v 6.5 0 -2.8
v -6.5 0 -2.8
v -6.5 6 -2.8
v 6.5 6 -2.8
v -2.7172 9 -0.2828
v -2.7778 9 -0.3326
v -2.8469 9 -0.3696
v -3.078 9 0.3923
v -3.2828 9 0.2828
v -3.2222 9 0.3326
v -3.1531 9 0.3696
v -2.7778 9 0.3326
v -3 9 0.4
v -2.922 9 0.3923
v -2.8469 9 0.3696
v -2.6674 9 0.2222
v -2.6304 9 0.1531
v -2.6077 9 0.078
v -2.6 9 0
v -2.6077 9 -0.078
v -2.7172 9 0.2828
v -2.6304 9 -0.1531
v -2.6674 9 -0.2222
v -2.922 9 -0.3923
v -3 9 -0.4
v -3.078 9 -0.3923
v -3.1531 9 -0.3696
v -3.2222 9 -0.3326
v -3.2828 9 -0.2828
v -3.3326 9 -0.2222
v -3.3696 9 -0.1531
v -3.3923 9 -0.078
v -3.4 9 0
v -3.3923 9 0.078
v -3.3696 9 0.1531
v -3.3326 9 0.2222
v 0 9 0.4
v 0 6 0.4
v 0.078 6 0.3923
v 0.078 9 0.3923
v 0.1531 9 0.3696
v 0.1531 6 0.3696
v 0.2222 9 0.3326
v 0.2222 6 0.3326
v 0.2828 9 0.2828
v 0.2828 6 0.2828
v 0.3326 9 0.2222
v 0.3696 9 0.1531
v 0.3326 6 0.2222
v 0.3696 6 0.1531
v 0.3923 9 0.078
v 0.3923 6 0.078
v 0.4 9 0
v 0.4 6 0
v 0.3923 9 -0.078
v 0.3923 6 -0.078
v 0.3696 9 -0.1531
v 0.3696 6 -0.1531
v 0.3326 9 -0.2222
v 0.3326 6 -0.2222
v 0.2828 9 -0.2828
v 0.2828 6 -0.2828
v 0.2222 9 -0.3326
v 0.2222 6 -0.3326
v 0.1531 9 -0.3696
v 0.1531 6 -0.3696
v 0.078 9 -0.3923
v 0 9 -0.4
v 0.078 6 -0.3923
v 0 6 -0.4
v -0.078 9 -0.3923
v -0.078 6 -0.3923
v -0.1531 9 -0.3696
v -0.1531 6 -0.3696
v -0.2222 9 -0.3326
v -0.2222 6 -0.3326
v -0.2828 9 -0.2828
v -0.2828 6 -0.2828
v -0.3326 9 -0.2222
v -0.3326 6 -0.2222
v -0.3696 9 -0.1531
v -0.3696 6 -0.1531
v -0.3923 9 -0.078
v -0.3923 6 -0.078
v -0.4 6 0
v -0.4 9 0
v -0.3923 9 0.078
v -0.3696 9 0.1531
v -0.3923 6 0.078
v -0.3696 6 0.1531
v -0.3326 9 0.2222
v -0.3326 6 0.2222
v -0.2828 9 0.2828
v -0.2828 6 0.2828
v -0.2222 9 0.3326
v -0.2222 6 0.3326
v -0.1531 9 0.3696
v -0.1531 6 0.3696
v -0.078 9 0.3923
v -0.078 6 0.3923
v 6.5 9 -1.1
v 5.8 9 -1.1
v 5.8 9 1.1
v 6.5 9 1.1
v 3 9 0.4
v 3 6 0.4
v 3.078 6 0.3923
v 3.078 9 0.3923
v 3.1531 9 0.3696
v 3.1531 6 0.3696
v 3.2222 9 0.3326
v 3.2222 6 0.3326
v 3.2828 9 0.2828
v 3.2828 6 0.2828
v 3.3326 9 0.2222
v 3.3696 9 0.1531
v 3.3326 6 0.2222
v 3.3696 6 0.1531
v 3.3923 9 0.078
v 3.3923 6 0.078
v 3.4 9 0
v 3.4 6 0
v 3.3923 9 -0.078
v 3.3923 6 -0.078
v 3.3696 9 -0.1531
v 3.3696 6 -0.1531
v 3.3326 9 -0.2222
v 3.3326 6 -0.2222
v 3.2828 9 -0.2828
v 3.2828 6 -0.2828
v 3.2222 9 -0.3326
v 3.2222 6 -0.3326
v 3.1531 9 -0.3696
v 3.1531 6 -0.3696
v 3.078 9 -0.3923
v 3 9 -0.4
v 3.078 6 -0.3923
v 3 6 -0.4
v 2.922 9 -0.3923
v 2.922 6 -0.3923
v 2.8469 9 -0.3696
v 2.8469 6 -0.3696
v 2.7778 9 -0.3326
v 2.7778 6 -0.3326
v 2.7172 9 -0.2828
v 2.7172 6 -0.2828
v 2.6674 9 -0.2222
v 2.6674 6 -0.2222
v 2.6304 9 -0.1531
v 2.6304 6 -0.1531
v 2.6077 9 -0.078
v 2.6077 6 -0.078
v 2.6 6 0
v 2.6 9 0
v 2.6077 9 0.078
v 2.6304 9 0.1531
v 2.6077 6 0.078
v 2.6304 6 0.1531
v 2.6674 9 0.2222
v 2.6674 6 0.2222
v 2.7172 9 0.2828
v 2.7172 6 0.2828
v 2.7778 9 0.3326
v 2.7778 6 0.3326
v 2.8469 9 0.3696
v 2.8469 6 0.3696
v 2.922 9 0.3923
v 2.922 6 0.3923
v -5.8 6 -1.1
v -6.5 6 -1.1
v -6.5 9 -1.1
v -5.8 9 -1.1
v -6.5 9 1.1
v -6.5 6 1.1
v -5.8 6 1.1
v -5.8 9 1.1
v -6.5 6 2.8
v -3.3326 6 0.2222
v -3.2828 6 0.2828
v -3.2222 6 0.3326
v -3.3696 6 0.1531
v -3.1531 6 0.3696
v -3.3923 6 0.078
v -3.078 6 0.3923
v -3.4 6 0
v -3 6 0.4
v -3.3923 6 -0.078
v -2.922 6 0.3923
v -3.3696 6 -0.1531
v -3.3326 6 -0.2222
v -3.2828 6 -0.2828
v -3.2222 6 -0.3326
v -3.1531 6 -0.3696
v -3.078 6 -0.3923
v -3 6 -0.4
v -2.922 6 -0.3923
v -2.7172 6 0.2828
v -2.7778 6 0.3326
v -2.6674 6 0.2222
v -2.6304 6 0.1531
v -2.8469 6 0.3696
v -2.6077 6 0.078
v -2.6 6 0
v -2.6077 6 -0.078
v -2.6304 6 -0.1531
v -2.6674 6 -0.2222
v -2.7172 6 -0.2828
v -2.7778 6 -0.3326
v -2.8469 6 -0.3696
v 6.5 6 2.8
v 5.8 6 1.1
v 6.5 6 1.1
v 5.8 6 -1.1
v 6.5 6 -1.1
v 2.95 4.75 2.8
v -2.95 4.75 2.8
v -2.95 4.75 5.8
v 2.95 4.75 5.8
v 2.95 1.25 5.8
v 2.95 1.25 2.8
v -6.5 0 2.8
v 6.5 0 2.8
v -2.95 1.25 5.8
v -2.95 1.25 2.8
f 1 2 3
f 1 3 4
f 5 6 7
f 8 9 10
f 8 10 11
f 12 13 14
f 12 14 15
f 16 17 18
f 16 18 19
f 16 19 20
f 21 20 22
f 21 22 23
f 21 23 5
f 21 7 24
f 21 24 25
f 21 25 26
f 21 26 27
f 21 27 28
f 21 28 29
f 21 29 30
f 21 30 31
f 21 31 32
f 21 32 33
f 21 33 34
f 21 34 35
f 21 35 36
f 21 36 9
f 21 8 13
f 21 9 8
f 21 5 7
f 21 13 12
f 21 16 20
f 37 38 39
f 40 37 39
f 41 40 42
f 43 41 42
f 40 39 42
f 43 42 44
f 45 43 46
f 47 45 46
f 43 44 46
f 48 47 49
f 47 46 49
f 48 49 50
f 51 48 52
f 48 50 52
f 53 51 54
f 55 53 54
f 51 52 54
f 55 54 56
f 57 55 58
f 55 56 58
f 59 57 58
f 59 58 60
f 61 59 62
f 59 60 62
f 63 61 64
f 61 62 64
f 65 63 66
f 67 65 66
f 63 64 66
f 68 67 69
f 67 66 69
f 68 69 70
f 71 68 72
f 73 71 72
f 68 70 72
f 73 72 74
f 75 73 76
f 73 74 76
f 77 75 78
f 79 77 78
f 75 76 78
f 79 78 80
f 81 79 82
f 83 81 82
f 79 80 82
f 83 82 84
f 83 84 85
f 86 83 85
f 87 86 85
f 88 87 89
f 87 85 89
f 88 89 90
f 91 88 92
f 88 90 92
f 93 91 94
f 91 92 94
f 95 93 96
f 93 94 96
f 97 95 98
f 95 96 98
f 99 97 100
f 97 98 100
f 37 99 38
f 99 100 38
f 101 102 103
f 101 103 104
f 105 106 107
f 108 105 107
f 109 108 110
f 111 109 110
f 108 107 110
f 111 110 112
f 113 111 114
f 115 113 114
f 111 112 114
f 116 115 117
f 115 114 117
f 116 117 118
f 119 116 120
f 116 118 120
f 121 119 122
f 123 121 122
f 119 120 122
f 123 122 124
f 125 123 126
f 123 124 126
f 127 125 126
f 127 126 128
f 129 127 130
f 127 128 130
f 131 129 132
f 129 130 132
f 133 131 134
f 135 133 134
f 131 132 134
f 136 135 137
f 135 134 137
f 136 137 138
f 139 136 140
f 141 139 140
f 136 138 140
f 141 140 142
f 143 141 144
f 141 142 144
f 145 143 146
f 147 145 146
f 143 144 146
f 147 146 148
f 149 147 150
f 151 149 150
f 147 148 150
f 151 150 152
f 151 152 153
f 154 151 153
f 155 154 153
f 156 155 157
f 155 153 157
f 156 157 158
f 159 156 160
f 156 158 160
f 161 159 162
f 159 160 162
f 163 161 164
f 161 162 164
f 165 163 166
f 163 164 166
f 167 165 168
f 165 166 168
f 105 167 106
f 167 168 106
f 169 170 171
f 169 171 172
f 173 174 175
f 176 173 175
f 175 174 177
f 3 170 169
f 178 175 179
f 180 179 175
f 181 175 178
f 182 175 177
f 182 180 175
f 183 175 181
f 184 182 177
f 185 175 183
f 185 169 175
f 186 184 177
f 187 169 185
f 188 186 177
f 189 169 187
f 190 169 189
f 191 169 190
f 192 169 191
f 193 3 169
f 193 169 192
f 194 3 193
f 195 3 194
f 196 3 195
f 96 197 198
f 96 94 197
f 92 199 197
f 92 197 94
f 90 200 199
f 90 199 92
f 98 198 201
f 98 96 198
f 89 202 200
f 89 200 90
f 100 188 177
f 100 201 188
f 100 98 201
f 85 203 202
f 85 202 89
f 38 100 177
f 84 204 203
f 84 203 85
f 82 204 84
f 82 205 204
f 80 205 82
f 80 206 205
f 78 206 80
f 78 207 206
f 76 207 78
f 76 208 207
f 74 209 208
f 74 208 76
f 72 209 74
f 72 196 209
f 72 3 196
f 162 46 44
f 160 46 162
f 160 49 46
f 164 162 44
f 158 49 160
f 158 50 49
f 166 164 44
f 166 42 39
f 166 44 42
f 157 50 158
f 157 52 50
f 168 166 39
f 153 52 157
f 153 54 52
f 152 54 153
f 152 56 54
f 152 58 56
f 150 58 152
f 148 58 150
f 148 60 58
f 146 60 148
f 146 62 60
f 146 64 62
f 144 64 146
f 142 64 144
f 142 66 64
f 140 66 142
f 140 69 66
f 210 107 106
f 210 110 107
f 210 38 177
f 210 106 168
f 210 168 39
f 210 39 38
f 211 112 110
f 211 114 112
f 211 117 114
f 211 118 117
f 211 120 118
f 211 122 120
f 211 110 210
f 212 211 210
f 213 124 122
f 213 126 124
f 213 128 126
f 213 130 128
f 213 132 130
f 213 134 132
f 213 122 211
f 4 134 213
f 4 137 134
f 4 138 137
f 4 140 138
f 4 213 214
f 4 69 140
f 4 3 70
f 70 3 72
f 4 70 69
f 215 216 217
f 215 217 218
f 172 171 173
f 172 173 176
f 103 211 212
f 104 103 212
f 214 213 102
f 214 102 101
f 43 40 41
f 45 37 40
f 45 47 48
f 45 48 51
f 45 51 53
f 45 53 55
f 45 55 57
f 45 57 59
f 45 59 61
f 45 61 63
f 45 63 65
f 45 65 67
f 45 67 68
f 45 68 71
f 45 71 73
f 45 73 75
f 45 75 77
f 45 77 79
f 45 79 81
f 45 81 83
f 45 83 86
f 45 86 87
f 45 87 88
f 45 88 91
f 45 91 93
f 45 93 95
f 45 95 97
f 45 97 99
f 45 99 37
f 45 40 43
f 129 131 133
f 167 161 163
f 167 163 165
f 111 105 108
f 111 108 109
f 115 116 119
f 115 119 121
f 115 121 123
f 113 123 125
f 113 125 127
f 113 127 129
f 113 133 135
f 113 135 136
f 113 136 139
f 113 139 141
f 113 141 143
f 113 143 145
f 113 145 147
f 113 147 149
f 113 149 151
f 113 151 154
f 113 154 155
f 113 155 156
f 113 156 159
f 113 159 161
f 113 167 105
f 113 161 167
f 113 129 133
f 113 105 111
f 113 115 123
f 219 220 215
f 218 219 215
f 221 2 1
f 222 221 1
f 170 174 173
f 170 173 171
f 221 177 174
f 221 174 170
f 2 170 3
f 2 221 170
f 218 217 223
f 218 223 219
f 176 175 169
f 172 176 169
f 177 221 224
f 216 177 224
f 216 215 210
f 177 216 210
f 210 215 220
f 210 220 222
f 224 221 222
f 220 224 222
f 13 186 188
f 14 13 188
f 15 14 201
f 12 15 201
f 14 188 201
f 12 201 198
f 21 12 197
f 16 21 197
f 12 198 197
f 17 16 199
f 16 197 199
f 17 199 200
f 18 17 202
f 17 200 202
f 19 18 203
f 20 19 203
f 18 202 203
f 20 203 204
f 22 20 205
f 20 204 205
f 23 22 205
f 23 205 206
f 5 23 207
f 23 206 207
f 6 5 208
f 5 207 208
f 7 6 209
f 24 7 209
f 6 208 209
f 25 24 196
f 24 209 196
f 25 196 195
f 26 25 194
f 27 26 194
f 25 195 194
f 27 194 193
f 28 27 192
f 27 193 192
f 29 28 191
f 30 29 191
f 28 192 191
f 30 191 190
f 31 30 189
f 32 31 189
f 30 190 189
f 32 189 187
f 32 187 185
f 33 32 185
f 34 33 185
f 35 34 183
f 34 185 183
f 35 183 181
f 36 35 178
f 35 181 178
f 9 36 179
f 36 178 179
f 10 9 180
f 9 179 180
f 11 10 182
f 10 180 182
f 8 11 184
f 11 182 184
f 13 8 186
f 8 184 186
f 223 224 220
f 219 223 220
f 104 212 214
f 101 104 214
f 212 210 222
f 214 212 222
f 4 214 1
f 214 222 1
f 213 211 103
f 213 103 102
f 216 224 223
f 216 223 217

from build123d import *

# Parameters (mm, degrees)
SKETCH1_W           = 13
SKETCH1_H           = 5.6
BOSS_EXTRUDE1_DEPTH = 6
SKETCH2_R           = 0.4
SKETCH2_W           = 0.7
SKETCH2_H           = 2.2
BOSS_EXTRUDE2_DEPTH = 3
SKETCH3_W           = 5.9
SKETCH3_H           = 3.5
BOSS_EXTRUDE3_DEPTH = 3


with BuildPart() as part:
    # Sketch1 → Boss-Extrude1 (new body)
    with BuildSketch(Plane(origin=(0, 0, 0), x_dir=(1, 0, 0), z_dir=(0, 1, 0))):
        Rectangle(SKETCH1_W, SKETCH1_H)
    extrude(amount=BOSS_EXTRUDE1_DEPTH)

    # Sketch2 → Boss-Extrude2 (add)
    with BuildSketch(Plane(origin=(0, 6, 0), x_dir=(1, 0, 0), z_dir=(0, 1, 0))):
        with Locations(Location((-3, 0, 0), (0, 0, 270))):
            Circle(SKETCH2_R)
        with Locations(Location((0, 0, 0), (0, 0, 270))):
            Circle(SKETCH2_R)
        with Locations(Location((3, 0, 0), (0, 0, 270))):
            Circle(SKETCH2_R)
        with Locations((-6.15, 0)):
            Rectangle(SKETCH2_W, SKETCH2_H)
        with Locations((6.15, 0)):
            Rectangle(SKETCH2_W, SKETCH2_H)
    extrude(amount=BOSS_EXTRUDE2_DEPTH)

    # Sketch3 → Boss-Extrude3 (add)
    with BuildSketch(Plane.XY.offset(2.8)):
        with Locations((0, 3)):
            Rectangle(SKETCH3_W, SKETCH3_H)
    extrude(amount=BOSS_EXTRUDE3_DEPTH)


solid = part.part
